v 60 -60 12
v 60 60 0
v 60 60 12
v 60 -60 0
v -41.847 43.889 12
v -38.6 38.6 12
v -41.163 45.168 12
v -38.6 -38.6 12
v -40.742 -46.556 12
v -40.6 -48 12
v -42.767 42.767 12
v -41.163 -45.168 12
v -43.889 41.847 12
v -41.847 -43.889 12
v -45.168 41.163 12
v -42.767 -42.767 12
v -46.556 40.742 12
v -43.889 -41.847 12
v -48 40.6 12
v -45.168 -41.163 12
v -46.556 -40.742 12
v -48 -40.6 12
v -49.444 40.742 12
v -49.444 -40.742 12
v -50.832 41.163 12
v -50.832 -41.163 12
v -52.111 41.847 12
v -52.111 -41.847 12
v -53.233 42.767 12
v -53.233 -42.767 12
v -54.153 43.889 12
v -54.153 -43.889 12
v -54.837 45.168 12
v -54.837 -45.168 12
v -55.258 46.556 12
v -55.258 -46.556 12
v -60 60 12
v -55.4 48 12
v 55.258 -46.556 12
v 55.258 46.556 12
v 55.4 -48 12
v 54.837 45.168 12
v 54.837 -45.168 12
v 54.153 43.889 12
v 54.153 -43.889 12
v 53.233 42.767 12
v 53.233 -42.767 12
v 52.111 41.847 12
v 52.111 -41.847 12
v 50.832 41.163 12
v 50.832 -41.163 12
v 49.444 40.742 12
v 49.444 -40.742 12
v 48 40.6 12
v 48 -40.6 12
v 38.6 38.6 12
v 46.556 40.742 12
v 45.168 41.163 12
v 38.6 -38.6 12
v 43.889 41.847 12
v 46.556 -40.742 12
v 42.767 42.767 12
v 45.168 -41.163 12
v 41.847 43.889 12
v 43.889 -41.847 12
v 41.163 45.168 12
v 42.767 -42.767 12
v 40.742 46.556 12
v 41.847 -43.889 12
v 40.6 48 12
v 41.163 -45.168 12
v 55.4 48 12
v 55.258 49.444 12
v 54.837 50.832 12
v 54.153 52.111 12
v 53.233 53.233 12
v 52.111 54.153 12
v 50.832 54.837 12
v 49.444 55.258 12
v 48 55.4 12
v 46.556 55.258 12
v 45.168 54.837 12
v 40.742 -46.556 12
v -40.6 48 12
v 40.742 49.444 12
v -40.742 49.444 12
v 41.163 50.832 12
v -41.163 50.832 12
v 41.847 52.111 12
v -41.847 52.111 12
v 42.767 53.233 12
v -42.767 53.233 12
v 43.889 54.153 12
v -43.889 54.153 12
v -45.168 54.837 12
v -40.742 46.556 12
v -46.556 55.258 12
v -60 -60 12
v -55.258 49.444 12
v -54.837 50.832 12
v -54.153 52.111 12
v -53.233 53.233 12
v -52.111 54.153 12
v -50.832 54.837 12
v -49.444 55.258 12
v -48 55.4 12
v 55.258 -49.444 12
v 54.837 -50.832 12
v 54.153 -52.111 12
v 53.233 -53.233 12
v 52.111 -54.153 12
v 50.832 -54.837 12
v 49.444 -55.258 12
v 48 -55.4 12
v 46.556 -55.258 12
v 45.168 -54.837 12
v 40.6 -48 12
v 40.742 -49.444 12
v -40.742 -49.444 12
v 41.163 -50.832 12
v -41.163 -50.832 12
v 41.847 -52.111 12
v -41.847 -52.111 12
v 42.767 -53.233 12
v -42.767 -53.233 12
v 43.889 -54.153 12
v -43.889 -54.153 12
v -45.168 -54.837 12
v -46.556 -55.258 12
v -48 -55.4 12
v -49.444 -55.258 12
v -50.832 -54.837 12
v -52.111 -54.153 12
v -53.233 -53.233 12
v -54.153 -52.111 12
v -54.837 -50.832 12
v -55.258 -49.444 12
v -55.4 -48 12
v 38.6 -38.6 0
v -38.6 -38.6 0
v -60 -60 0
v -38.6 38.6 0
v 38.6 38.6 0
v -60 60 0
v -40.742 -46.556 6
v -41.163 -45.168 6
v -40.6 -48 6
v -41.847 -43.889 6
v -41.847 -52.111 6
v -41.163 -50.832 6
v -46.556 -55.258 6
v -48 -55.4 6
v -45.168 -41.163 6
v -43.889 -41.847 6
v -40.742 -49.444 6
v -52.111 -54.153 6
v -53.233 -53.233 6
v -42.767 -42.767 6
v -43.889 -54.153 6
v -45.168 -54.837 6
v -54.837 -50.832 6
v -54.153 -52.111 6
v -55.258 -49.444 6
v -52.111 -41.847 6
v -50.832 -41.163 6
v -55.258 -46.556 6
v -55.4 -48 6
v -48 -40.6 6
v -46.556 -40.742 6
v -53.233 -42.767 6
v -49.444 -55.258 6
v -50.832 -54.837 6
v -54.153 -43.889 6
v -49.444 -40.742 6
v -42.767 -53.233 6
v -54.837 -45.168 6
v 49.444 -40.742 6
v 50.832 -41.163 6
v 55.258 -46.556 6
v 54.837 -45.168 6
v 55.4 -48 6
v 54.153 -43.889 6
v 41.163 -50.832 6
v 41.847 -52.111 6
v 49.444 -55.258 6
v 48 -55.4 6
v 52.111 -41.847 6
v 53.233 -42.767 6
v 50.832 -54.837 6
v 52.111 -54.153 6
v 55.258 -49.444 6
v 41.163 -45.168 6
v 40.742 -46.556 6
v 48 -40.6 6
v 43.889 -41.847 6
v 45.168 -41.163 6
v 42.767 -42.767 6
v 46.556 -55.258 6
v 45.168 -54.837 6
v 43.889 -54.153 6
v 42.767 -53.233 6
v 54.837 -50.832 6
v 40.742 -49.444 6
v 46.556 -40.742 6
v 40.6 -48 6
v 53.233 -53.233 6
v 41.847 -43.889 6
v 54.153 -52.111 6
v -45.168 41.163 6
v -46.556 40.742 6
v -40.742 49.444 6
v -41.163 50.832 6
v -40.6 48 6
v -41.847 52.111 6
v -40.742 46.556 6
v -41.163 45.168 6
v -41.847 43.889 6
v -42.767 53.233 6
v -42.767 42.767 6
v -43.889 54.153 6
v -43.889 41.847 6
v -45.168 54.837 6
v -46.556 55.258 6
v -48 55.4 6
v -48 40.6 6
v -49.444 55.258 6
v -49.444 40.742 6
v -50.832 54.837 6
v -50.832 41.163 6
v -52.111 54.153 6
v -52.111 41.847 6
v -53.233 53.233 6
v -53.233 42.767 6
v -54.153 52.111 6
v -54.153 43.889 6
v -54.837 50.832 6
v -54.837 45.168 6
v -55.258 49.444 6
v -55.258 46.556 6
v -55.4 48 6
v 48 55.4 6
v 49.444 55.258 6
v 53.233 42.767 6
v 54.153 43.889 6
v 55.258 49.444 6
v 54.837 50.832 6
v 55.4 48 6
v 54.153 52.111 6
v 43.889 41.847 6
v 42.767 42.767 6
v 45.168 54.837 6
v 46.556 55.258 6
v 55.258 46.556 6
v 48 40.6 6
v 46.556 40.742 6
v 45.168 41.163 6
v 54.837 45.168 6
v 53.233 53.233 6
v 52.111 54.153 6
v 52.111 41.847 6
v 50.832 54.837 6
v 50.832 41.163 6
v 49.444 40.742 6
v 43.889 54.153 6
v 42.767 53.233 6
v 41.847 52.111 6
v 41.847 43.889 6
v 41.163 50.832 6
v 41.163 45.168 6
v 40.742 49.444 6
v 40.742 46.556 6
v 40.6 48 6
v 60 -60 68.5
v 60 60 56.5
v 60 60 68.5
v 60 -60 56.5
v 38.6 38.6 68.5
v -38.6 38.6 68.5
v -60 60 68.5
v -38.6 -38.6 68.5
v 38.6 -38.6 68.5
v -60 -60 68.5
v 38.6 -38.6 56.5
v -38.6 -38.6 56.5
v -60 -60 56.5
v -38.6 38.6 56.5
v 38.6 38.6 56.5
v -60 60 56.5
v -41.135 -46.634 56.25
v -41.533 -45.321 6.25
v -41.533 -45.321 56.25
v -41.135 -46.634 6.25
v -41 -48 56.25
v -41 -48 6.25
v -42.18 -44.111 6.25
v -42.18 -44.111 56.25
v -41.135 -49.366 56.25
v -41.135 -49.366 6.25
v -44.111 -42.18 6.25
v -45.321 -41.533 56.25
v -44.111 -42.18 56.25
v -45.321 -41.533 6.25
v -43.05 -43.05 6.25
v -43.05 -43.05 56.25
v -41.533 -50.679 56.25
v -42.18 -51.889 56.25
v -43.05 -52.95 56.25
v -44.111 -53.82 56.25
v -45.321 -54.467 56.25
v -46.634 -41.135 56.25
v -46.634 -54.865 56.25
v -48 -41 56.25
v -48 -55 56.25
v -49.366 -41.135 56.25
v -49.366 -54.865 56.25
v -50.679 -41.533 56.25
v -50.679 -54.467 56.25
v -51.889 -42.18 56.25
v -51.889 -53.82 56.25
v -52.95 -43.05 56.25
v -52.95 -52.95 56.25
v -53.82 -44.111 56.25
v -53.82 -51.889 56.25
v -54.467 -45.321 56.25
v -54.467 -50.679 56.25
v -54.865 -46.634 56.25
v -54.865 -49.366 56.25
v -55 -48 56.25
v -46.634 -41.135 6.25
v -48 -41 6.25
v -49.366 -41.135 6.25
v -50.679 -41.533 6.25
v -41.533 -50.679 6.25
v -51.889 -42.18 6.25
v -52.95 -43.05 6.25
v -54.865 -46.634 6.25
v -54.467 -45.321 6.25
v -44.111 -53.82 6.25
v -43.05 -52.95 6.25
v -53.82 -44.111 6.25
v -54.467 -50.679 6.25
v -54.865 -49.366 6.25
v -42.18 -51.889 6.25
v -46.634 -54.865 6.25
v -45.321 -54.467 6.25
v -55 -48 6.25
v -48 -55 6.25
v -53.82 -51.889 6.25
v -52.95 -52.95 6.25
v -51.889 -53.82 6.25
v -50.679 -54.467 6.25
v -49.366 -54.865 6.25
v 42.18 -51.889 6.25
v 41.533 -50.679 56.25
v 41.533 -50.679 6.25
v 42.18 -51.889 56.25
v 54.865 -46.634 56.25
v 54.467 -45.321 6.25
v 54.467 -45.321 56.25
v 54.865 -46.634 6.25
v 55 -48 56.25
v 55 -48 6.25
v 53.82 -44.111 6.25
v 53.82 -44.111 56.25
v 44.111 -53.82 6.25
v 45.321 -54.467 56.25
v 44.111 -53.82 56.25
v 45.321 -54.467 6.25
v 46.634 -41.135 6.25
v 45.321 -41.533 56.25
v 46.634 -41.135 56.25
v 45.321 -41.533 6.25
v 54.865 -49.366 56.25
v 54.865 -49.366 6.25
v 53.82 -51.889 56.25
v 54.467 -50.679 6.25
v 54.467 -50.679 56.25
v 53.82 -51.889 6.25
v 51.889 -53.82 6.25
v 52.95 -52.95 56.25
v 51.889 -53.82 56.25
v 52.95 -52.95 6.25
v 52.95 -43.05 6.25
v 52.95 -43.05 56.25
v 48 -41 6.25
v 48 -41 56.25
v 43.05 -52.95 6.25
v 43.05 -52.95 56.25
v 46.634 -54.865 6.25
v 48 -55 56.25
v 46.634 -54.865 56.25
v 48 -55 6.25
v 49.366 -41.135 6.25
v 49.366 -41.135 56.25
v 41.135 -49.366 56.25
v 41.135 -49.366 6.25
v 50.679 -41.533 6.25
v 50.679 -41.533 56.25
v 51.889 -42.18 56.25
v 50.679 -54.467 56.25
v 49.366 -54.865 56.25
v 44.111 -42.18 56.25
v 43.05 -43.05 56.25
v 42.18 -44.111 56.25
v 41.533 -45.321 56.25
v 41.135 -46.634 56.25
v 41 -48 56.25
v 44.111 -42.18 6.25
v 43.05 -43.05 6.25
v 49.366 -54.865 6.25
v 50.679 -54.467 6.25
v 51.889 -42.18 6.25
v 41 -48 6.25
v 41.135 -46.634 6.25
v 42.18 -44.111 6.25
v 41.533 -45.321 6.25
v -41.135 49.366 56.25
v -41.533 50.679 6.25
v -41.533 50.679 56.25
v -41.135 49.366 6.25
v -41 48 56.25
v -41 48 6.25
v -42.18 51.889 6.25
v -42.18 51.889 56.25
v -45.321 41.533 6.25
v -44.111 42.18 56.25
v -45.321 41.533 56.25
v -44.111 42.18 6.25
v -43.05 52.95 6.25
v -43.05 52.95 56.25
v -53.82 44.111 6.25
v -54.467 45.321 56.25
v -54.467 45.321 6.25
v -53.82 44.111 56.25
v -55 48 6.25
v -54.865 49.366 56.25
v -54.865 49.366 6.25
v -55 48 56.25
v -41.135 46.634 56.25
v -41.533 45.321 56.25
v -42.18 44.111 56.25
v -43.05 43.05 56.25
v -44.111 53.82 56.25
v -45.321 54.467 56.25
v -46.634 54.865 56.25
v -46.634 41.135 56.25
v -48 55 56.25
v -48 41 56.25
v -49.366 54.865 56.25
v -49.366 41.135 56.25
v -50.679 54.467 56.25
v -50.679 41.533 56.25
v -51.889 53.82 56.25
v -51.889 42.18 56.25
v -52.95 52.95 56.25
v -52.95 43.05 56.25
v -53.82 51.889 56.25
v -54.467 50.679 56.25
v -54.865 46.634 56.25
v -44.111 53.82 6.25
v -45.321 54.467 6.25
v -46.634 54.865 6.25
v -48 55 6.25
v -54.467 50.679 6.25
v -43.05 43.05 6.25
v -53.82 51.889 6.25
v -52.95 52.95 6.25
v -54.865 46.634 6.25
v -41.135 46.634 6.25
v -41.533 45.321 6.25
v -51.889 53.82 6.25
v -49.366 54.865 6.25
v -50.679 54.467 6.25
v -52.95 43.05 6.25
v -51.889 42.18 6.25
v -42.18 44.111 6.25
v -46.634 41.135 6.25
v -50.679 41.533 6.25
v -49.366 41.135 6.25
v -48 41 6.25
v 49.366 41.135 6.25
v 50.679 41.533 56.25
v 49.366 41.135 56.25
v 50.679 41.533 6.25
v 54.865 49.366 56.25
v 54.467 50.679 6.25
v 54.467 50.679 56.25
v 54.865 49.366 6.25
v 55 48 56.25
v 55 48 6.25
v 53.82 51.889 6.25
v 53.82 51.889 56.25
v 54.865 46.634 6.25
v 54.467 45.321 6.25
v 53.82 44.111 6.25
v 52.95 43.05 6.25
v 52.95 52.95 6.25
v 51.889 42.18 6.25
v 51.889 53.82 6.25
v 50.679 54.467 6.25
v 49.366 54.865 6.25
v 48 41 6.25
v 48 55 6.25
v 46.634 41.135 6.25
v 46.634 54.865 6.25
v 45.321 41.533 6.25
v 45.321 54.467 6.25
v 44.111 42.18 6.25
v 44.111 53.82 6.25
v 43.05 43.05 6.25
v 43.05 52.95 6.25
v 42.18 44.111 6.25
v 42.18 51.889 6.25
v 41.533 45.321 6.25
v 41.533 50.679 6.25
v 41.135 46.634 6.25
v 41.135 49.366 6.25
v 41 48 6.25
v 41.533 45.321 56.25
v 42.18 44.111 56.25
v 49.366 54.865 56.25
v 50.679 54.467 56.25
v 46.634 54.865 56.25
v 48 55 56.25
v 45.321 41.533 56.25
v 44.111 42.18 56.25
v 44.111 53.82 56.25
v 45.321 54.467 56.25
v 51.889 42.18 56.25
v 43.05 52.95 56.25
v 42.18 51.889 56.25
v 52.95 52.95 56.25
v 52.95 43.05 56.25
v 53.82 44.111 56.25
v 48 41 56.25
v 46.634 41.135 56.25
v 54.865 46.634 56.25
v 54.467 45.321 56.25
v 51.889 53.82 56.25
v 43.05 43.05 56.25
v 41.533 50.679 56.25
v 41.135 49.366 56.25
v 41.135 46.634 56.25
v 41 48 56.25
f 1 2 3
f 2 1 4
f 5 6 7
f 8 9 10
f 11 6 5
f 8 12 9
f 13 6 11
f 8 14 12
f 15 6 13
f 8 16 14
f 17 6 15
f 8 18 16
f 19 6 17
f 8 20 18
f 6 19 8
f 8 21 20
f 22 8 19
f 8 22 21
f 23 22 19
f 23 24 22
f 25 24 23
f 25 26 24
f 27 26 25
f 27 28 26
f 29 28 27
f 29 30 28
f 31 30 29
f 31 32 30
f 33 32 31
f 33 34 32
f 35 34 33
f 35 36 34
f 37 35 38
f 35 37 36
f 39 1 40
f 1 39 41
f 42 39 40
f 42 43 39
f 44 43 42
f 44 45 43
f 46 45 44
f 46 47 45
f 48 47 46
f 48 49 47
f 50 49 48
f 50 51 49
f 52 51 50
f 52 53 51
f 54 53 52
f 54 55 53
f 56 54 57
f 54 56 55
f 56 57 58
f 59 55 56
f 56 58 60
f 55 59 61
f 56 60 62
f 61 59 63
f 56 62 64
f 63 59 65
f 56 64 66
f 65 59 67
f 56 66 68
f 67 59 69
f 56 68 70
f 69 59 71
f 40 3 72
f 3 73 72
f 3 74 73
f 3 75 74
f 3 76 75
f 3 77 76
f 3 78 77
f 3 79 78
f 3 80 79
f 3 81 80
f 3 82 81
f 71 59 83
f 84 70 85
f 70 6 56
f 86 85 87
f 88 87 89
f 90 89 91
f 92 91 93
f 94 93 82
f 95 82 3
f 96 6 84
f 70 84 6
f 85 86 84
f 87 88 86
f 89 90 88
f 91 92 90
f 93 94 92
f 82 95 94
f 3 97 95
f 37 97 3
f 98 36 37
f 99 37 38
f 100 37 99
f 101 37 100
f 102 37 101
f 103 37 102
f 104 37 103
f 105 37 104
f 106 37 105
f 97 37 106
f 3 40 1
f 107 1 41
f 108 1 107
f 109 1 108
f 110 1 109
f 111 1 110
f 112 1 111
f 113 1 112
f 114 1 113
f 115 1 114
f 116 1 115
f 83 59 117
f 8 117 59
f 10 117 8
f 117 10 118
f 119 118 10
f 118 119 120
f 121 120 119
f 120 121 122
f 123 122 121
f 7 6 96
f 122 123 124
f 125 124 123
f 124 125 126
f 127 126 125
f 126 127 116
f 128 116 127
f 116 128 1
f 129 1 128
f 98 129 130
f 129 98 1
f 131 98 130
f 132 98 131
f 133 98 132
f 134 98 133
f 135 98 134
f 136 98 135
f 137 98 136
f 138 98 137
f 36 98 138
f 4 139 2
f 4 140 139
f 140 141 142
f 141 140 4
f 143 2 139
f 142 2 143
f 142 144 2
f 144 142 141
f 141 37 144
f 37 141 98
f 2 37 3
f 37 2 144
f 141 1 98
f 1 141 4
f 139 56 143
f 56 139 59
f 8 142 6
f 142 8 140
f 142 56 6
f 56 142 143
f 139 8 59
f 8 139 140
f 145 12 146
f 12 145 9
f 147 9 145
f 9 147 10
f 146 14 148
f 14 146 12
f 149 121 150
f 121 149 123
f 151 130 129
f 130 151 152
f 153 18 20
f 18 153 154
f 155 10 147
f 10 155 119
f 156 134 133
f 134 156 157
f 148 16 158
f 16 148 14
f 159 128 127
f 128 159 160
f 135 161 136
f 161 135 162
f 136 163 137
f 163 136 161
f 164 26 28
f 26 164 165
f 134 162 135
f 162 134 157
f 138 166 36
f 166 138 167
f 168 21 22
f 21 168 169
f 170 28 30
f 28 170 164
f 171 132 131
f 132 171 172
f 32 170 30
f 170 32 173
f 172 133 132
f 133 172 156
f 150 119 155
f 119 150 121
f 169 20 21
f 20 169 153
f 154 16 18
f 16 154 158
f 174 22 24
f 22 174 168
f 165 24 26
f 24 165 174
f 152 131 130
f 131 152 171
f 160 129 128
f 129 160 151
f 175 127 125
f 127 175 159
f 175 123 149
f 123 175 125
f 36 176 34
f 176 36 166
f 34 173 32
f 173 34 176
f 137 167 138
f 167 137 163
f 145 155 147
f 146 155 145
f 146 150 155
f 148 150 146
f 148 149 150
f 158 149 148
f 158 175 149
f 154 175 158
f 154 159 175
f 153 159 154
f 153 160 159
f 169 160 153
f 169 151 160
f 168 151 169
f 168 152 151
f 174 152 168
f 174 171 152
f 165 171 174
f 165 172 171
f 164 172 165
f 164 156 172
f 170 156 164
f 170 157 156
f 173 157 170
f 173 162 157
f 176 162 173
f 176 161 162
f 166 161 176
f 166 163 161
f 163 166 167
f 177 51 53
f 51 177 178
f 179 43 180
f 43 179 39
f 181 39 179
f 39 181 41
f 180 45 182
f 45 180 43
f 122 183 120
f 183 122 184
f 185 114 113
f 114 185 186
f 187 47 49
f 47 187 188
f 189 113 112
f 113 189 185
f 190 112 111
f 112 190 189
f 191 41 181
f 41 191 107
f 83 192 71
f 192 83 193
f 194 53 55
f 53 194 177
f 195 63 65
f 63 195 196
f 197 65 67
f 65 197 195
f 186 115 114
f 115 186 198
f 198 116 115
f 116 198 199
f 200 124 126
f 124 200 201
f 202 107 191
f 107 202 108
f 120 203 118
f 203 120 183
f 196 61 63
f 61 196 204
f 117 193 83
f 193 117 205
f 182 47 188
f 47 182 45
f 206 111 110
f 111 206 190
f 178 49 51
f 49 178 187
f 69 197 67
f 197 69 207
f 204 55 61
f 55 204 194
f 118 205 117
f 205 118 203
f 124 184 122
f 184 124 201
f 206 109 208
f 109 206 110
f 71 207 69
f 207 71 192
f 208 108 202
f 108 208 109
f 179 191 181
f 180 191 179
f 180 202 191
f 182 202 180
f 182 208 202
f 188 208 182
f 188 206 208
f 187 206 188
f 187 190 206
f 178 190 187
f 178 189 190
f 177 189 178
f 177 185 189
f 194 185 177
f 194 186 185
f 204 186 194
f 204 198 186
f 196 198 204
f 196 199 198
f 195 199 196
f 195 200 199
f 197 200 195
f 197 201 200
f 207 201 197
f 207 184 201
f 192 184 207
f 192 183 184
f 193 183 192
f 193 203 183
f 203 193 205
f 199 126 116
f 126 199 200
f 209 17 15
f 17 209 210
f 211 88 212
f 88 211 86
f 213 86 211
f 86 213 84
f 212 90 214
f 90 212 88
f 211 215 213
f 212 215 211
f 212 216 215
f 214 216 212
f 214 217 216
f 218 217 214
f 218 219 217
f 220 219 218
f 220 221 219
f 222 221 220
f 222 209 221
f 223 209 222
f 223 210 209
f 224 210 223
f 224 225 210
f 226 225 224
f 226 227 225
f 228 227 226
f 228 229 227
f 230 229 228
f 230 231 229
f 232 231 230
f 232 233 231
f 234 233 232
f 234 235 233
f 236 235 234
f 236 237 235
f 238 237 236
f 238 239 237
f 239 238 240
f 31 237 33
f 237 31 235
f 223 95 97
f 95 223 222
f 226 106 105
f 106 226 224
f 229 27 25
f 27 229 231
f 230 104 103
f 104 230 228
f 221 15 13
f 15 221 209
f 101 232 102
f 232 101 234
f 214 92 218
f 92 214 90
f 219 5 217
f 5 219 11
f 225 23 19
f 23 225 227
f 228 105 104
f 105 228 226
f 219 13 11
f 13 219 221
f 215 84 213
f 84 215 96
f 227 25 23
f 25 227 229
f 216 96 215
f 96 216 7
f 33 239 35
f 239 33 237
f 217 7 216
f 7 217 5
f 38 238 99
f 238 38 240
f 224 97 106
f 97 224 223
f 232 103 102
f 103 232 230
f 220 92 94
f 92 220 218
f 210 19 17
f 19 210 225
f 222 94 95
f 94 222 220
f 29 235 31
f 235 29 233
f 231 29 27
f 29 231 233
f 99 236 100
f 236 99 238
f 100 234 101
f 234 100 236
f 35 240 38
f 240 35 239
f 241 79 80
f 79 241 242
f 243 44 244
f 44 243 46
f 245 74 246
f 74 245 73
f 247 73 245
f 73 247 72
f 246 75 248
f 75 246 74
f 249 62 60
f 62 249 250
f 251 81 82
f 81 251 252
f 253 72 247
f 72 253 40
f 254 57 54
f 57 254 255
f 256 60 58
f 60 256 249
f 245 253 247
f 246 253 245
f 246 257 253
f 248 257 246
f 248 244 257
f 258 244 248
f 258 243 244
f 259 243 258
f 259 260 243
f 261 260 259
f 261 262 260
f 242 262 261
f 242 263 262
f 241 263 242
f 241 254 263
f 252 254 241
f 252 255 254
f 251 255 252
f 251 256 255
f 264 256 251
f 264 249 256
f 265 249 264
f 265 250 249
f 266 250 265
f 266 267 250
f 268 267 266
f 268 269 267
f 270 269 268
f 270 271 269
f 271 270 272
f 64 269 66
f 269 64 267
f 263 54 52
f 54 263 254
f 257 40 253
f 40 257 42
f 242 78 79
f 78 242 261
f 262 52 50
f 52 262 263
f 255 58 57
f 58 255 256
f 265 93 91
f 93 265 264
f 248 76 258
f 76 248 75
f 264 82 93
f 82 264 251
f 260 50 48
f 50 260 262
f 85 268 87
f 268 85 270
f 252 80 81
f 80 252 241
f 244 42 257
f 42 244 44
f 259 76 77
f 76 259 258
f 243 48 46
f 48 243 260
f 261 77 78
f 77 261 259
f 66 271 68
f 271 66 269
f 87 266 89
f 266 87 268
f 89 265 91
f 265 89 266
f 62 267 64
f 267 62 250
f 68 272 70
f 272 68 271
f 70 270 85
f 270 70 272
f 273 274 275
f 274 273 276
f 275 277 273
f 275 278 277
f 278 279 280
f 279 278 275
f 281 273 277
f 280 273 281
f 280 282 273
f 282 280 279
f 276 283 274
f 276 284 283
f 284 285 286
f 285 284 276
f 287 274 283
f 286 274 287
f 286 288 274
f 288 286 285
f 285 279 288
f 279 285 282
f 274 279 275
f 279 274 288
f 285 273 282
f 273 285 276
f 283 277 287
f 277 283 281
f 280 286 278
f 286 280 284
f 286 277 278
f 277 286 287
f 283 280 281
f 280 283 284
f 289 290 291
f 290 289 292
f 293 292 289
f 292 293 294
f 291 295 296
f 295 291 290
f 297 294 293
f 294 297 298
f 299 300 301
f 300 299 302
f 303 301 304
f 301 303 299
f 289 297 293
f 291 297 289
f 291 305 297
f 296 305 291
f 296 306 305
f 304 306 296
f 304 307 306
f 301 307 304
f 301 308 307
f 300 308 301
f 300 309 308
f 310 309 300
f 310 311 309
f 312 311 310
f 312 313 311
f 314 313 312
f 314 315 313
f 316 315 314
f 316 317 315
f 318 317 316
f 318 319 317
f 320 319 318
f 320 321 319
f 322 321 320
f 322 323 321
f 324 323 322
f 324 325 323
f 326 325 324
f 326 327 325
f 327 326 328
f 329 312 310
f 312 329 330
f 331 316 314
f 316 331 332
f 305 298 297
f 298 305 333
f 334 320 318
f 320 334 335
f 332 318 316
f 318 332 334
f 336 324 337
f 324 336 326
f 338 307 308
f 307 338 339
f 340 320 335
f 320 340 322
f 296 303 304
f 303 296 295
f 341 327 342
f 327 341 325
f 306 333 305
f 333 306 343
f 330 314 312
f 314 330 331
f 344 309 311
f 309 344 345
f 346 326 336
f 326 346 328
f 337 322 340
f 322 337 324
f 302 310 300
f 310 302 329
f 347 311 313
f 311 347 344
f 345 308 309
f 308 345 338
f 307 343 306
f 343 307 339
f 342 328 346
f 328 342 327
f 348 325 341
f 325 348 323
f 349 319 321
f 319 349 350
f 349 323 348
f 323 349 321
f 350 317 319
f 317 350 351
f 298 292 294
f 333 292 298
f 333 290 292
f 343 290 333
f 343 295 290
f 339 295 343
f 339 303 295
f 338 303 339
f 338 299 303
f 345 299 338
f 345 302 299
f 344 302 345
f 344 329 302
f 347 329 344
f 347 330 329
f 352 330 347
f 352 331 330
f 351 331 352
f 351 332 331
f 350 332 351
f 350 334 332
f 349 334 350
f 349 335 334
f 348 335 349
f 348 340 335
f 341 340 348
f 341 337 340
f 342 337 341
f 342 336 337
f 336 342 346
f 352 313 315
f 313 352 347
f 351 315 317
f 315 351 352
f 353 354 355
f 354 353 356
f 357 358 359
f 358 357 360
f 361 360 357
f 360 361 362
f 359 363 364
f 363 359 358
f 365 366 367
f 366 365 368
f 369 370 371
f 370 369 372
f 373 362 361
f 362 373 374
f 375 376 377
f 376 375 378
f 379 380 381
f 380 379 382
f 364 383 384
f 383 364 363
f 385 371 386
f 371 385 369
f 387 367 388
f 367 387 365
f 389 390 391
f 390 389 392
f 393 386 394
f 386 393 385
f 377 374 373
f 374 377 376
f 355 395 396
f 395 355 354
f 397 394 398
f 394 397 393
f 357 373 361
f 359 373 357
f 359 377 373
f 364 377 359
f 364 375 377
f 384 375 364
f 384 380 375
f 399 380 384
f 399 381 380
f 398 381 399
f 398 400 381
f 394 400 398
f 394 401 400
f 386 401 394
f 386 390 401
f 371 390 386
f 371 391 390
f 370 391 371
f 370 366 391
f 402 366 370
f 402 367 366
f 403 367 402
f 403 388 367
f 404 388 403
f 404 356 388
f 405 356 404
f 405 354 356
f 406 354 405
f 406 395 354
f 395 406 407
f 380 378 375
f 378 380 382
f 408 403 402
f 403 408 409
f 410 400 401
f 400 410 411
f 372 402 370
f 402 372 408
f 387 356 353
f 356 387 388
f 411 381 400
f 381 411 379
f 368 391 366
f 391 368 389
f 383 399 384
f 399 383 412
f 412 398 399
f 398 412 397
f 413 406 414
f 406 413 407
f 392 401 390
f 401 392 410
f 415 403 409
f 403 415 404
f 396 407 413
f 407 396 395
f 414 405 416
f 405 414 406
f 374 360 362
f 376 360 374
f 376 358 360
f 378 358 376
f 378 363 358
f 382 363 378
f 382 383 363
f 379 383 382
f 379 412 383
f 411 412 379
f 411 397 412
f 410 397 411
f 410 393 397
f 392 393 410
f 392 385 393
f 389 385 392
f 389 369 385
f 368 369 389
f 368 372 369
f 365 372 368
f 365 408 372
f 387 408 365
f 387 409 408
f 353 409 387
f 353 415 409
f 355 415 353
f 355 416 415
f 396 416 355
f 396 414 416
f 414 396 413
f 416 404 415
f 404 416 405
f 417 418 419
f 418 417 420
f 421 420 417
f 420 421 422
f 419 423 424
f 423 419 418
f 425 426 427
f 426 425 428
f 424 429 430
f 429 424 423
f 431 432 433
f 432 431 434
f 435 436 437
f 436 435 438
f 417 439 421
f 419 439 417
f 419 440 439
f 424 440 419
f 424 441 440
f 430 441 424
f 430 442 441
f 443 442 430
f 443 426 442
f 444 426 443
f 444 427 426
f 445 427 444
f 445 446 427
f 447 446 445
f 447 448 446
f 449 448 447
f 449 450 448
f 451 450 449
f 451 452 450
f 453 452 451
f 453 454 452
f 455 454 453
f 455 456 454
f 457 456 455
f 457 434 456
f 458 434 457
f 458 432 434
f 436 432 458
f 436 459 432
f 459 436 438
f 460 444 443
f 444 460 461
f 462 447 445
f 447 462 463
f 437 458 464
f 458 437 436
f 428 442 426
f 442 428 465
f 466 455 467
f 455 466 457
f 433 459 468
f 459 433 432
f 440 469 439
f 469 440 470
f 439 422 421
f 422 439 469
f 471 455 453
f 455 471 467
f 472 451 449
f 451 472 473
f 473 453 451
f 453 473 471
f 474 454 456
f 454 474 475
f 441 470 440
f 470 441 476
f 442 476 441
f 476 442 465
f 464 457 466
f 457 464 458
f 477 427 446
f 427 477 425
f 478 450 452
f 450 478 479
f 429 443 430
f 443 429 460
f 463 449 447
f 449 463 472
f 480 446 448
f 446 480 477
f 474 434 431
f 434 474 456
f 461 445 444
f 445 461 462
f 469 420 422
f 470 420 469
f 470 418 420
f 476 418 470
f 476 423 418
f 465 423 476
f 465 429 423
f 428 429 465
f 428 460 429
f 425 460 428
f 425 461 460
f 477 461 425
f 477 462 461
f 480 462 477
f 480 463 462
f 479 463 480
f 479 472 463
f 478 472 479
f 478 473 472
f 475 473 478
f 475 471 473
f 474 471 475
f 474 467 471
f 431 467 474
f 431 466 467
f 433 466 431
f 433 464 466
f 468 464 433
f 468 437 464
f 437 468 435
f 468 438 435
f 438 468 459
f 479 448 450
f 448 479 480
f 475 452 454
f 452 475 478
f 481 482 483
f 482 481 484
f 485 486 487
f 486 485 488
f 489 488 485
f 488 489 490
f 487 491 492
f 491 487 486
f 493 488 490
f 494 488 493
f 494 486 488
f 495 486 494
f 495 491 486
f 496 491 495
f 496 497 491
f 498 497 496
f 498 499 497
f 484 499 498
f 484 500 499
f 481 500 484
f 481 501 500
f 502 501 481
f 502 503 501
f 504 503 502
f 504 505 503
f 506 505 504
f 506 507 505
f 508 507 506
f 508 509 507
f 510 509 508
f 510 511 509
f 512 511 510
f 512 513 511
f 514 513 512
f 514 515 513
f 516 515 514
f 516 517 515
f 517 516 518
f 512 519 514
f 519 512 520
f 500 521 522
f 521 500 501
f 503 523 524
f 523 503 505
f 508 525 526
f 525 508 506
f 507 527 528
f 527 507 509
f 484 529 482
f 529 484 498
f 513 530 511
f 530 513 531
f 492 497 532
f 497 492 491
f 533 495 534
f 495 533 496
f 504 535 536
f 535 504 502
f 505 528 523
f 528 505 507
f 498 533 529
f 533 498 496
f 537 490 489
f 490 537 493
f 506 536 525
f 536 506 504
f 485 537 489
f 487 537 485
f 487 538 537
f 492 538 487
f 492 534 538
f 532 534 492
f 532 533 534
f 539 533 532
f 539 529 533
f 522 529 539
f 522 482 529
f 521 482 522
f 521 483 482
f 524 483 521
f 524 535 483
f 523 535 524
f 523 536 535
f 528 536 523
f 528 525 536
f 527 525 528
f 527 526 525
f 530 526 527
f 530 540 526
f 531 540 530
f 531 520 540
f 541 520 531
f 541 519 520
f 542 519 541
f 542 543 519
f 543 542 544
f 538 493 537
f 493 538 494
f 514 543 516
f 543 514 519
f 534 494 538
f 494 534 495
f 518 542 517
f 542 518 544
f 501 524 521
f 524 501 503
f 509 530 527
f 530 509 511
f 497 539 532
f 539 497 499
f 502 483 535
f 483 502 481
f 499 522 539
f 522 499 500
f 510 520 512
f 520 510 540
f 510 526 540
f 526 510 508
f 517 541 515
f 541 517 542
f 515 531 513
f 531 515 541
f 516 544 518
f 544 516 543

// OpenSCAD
$fn = 32;

// ------------------------------------------------------------------------
// Frame cube: base 120 x 120 mm, posts 50 mm tall
// Every part is its own module, assembly() places every instance.
// ------------------------------------------------------------------------

// --- part 1 ---
module base_frame() {
  difference() {
    translate([-60, -60, 0]) cube([120, 120, 12]);
    translate([-38.6, -38.6, -1]) cube([77.2, 77.2, 14]);
    translate([-48, -48, 6]) cylinder(h = 7, d = 14.8);
    translate([48, -48, 6]) cylinder(h = 7, d = 14.8);
    translate([-48, 48, 6]) cylinder(h = 7, d = 14.8);
    translate([48, 48, 6]) cylinder(h = 7, d = 14.8);
  }
}

// --- part 2 ---
module corner_post() {
  cylinder(h = 50, d = 14);
}

// --- part 3 ---
module top_frame() {
  difference() {
    translate([-60, -60, 0]) cube([120, 120, 12]);
    translate([-38.6, -38.6, -1]) cube([77.2, 77.2, 14]);
  }
}

// --- assembly ---
module assembly() {
  color([0.80, 0.24, 0.20]) translate([0, 0, 0]) rotate([0, 0, 0]) base_frame();
  color([0.20, 0.45, 0.75]) translate([-48, -48, 6.25]) rotate([0, 0, 0]) corner_post();
  color([0.25, 0.62, 0.32]) translate([48, -48, 6.25]) rotate([0, 0, 0]) corner_post();
  color([0.92, 0.70, 0.18]) translate([-48, 48, 6.25]) rotate([0, 0, 0]) corner_post();
  color([0.58, 0.35, 0.70]) translate([48, 48, 6.25]) rotate([0, 0, 0]) corner_post();
  color([0.16, 0.66, 0.66]) translate([0, 0, 56.5]) rotate([0, 0, 0]) top_frame();
}

assembly();
